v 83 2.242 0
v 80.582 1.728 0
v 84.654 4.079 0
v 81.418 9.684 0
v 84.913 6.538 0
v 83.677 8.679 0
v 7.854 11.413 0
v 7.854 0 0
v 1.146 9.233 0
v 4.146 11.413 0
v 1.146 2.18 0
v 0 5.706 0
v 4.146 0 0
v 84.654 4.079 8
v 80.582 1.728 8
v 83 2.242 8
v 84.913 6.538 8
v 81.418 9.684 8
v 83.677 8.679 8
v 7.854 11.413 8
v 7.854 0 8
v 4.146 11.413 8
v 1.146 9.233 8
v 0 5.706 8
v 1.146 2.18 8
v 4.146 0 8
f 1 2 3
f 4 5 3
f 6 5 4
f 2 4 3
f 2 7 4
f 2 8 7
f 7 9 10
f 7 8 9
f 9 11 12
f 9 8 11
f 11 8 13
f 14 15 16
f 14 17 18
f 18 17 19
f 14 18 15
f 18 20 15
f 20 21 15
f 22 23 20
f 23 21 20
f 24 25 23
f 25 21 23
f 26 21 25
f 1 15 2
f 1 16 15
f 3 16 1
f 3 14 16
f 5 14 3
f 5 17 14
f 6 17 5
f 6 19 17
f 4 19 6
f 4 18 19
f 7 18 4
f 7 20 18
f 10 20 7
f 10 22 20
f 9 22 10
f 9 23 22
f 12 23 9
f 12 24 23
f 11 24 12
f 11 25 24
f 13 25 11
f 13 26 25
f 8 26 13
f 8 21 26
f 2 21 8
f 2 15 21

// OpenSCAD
$fn = 32;

// ----------------------------------------------------------------------
// Lever arm: two bosses 12 and 8 mm, 75 mm between centres
// ----------------------------------------------------------------------

// --- parameters (mm) ---
profile_height = 8;       // extrusion height
profile_points = 13;      // points of the closed outline

profile = [[0, 5.706], [1.146, 2.18], [4.146, 0], [7.854, 0], [80.582, 1.728], [83, 2.242], [84.654, 4.079], [84.913, 6.538], [83.677, 8.679], [81.418, 9.684], [7.854, 11.413], [4.146, 11.413], [1.146, 9.233]];  // single closed polygon, 13 points, counter clockwise

// --- the one profile operation ---
linear_extrude(height = profile_height) polygon(points = profile);
